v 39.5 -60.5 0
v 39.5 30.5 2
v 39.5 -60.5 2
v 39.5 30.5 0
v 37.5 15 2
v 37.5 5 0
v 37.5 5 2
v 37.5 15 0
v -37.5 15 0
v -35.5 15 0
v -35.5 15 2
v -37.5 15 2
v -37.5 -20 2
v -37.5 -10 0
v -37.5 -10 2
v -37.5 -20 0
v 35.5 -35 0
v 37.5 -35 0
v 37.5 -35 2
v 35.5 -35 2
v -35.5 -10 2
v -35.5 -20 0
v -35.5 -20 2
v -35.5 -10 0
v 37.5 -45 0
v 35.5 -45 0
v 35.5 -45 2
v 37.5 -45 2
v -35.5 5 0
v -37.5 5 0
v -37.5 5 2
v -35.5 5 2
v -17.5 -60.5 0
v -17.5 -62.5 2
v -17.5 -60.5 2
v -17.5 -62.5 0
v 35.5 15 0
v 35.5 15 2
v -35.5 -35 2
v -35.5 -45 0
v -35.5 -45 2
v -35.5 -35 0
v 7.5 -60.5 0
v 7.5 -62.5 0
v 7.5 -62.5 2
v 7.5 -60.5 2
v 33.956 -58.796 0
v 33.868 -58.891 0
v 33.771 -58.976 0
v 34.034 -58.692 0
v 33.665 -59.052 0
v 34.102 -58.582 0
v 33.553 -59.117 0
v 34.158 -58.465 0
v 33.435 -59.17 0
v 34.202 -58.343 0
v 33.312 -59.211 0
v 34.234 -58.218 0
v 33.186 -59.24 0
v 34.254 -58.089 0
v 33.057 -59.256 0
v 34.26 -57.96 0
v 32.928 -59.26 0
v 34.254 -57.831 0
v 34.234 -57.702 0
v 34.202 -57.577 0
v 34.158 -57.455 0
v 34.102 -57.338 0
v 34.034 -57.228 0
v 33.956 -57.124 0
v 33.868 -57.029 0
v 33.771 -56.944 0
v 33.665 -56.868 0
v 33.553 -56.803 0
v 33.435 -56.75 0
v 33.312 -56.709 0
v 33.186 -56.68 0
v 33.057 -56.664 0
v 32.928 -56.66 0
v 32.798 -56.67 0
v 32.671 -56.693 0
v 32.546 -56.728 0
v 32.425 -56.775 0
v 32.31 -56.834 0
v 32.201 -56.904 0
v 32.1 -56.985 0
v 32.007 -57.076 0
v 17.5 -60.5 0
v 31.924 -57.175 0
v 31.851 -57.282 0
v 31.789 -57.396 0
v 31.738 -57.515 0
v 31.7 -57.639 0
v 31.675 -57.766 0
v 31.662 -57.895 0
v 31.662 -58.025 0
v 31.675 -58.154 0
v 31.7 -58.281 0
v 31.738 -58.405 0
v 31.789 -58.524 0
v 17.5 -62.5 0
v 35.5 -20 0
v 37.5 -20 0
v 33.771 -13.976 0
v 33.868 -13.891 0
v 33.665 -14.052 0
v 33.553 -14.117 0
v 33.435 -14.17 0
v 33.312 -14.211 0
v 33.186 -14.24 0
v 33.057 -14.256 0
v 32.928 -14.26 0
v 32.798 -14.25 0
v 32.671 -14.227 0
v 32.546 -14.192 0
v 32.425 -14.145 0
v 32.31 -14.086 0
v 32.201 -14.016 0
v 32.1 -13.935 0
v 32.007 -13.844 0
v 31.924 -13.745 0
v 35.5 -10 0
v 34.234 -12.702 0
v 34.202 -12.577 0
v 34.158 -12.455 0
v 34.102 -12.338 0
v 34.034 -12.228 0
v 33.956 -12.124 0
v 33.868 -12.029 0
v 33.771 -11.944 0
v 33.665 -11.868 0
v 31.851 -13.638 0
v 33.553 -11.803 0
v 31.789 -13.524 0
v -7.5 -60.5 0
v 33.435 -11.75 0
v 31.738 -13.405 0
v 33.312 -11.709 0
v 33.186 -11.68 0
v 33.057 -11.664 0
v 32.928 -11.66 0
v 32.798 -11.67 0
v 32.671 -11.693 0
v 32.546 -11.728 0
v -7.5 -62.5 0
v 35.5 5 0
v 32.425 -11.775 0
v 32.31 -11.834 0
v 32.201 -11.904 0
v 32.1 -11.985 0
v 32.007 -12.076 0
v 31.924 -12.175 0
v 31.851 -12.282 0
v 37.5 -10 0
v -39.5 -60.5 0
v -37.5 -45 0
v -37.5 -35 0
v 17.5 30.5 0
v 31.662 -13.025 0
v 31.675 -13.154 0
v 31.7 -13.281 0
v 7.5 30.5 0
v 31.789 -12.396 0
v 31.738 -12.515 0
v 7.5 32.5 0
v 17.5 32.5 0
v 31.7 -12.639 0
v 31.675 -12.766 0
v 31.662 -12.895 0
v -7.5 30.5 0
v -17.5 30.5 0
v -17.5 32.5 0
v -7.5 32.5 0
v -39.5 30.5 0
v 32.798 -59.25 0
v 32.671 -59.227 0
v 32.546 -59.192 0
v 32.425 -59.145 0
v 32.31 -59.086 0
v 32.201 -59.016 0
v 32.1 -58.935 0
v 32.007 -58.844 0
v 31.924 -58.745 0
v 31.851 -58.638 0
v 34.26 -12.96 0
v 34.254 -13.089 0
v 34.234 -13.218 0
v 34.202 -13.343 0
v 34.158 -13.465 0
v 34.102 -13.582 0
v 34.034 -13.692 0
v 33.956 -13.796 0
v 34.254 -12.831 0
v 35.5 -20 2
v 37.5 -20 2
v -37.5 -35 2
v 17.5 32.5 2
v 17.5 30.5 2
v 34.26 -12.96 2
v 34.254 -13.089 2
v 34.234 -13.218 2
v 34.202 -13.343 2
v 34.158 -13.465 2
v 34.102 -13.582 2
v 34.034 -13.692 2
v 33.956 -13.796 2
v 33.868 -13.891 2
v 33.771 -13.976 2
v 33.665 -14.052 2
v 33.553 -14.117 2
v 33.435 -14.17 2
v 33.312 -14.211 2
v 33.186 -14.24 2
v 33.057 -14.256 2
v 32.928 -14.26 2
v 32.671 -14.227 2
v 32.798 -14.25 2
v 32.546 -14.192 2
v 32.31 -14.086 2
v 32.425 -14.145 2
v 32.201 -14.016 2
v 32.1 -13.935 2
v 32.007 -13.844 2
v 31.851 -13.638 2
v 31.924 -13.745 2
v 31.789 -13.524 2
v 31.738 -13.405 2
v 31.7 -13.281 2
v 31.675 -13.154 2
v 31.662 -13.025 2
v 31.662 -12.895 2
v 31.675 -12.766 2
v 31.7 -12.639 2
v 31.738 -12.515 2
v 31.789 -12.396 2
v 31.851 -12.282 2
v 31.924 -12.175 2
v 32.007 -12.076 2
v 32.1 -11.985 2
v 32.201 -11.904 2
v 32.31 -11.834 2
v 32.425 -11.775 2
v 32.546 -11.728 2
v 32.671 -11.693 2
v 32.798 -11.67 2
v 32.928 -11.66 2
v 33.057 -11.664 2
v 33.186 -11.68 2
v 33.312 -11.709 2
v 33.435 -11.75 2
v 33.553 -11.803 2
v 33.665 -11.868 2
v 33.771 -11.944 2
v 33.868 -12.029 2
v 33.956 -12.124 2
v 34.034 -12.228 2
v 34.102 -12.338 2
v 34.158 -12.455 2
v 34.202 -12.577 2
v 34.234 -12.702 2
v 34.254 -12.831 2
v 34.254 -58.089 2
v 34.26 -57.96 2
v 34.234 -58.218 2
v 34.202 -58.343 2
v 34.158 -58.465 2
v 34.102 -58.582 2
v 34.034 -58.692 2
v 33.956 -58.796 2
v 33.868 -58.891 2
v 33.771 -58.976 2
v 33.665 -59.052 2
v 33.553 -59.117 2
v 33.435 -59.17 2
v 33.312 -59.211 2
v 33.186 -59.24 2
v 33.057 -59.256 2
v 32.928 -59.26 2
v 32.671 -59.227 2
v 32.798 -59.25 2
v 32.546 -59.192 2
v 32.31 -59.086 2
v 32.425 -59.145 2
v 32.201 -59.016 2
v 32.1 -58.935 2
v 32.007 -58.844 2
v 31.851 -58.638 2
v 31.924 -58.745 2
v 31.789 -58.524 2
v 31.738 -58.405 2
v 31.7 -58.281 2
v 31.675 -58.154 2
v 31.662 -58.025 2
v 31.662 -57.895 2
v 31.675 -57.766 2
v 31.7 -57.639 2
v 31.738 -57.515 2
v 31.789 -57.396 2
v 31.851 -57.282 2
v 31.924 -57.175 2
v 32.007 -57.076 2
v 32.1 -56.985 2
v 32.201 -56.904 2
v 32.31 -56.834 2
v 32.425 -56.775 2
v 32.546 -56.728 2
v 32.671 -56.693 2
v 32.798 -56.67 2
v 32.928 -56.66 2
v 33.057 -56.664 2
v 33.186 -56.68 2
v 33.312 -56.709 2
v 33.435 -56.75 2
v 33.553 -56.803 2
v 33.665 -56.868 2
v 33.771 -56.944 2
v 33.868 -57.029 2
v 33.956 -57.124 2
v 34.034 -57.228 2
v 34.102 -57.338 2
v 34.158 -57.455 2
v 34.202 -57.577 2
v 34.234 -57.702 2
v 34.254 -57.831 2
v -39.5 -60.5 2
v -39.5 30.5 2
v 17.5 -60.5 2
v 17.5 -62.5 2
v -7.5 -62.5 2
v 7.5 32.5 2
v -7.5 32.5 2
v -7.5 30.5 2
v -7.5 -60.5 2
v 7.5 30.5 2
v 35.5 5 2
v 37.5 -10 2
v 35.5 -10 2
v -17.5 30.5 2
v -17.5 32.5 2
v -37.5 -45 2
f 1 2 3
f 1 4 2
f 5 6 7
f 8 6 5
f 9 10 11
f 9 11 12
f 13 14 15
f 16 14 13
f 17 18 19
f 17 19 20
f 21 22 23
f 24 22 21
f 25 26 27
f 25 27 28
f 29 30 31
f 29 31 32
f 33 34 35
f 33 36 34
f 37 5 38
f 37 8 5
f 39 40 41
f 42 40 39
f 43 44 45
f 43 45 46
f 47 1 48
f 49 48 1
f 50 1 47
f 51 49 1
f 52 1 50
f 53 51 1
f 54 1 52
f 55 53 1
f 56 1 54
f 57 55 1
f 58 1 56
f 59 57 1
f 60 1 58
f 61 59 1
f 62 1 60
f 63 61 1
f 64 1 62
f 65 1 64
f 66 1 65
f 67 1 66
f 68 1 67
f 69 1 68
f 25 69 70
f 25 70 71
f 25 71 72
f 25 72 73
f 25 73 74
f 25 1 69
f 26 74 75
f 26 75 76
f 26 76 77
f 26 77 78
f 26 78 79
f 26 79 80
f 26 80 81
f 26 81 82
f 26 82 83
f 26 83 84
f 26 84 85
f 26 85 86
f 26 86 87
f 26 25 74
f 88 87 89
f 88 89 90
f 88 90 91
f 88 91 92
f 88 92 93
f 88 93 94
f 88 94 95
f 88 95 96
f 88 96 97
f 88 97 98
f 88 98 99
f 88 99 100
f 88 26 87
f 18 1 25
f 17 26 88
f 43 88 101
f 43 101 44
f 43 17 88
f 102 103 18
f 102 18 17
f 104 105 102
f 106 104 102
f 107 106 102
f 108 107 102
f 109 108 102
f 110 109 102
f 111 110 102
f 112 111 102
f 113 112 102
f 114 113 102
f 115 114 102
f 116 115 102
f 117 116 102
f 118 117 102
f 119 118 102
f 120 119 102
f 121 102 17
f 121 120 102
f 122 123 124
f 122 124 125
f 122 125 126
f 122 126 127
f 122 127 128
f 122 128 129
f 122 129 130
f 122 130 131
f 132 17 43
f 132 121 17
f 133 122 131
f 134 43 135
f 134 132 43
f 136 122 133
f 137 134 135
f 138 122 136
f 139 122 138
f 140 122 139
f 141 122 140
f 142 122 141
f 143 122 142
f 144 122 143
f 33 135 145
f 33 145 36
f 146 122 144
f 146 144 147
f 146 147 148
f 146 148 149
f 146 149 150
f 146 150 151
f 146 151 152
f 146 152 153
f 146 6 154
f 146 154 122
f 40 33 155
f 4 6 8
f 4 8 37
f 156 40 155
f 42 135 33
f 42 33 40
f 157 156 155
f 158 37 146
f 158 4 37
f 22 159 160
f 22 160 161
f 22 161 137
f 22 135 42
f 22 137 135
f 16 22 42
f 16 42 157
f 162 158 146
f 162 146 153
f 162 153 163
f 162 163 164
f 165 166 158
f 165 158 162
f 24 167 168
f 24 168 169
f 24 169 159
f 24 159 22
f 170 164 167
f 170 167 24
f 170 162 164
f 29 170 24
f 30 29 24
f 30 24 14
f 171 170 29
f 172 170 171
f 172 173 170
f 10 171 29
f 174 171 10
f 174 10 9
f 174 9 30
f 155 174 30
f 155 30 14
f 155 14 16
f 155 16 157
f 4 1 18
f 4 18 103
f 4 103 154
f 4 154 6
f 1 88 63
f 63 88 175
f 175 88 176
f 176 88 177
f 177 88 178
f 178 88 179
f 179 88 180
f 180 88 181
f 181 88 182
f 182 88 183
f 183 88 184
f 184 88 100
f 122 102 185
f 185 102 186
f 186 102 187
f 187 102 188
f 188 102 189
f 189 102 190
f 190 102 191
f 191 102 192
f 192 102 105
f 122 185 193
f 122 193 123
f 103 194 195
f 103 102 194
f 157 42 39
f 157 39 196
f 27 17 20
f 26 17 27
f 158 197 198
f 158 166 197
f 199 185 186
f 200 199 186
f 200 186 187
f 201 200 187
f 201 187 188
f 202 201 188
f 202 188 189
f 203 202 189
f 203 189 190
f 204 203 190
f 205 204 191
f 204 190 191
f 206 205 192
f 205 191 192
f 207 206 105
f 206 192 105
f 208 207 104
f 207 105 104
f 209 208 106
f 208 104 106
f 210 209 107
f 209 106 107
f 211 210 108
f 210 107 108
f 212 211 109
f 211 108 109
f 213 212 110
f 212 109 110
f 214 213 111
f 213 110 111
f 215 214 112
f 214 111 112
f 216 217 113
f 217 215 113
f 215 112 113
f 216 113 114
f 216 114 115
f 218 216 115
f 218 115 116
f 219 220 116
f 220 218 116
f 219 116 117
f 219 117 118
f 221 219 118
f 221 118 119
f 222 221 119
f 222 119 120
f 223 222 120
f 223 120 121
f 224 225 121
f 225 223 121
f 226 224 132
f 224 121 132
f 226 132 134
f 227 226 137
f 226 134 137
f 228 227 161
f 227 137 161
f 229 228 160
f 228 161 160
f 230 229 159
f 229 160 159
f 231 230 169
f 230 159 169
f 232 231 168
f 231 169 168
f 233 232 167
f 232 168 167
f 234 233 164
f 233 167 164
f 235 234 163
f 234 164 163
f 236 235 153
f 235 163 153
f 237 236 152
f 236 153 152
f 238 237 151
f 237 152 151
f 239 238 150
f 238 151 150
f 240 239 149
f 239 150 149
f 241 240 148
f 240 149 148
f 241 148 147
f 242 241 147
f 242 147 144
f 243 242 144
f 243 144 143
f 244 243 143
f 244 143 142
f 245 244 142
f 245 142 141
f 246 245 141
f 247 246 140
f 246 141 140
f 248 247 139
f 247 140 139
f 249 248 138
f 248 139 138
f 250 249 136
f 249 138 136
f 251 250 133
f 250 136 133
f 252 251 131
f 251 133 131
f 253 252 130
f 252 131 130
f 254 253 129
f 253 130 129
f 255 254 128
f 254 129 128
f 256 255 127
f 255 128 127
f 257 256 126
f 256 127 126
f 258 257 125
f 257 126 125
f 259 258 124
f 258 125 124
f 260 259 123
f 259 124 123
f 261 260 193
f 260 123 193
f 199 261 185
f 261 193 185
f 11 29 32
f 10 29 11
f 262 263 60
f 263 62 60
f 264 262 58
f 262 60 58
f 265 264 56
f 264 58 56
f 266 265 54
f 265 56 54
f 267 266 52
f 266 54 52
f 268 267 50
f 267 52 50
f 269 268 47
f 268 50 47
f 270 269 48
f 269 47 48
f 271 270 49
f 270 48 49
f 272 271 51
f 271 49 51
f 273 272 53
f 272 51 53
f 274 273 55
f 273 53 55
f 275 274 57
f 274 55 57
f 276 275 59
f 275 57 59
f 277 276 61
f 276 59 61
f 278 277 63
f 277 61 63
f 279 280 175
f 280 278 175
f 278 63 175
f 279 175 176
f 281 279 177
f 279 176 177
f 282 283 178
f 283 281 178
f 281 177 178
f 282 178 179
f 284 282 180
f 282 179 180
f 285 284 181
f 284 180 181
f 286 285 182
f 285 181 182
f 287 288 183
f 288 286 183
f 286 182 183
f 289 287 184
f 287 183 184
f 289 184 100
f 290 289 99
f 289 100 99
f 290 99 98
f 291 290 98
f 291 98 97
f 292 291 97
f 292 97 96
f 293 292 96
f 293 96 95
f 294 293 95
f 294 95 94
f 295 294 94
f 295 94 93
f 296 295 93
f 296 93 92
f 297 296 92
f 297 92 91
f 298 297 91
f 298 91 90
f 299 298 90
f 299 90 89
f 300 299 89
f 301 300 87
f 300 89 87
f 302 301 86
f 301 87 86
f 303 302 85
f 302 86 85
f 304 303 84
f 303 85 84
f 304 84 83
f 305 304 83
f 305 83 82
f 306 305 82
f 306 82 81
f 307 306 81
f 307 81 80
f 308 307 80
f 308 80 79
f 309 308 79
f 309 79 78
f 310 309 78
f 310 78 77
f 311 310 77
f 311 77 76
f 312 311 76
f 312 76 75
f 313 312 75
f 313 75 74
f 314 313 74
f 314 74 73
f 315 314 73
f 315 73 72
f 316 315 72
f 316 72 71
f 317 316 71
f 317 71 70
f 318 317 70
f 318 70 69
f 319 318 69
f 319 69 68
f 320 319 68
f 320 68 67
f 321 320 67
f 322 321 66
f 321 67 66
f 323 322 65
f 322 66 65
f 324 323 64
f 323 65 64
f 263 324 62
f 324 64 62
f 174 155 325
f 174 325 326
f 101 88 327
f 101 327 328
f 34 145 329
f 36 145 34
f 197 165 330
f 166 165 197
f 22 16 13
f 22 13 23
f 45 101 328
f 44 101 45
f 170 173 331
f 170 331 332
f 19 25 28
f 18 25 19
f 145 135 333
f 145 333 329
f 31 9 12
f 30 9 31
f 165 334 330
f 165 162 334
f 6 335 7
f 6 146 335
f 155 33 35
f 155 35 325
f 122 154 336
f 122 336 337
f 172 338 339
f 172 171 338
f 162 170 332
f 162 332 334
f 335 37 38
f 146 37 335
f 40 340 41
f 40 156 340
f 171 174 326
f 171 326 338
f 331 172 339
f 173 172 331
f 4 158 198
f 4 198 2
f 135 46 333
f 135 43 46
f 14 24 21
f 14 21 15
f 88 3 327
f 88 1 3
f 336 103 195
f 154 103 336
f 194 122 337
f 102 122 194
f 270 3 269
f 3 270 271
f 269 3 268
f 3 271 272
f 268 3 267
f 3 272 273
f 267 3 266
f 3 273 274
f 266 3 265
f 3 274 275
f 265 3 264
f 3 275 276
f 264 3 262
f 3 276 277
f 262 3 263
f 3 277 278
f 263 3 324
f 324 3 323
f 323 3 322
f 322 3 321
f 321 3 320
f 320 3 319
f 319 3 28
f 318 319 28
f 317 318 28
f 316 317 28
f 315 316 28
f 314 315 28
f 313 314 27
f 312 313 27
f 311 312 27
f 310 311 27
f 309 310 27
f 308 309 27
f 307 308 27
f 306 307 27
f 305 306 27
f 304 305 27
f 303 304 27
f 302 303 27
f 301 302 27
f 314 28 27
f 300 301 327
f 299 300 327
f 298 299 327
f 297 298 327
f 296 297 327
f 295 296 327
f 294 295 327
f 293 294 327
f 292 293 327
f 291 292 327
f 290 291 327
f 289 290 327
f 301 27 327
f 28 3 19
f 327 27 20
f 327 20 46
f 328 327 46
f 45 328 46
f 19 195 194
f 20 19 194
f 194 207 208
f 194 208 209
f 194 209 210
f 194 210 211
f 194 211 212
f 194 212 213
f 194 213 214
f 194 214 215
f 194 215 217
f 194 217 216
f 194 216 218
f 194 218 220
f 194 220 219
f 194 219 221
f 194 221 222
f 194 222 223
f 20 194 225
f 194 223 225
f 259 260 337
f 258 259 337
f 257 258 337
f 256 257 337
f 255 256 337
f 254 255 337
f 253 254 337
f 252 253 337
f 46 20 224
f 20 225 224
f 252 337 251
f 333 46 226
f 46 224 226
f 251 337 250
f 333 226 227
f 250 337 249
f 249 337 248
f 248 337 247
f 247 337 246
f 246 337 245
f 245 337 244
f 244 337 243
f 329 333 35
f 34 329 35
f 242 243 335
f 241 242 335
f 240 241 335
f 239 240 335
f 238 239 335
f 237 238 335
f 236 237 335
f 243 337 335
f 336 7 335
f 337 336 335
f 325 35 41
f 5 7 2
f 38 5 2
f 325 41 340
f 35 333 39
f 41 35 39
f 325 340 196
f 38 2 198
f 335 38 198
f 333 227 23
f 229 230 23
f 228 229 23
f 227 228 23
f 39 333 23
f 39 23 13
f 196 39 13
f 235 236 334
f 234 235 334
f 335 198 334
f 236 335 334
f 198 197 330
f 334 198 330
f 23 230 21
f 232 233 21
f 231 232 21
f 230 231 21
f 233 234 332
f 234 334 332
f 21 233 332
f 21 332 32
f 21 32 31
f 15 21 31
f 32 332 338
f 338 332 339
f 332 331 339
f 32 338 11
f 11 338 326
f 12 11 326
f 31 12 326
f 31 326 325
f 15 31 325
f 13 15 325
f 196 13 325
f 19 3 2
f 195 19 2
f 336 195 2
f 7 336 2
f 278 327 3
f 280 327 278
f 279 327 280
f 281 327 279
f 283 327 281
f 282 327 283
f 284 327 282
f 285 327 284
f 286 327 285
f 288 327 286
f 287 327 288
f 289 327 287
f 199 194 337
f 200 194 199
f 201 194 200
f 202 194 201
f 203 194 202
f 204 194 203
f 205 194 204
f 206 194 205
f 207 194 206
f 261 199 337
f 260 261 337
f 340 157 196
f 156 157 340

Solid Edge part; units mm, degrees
sketch "Sketch1" plane through (0, 0, 0) normal (0, 0, 1) x (1, 0, 0)
  line L0 (7.5, -60.5) -> (-7.5, -60.5)
  line L1 (-7.5, -60.5) -> (-7.5, -62.5)
  line L2 (-7.5, -62.5) -> (-17.5, -62.5)
  line L3 (-17.5, -62.5) -> (-17.5, -60.5)
  line L4 (-17.5, -60.5) -> (-39.5, -60.5)
  line L5 (-39.5, -60.5) -> (-39.5, 30.5)
  line L6 (-39.5, 30.5) -> (-17.5, 30.5)
  line L7 (-17.5, 30.5) -> (-17.5, 32.5)
  line L8 (-17.5, 32.5) -> (-7.5, 32.5)
  line L9 (-7.5, 32.5) -> (-7.5, 30.5)
  line L10 (-7.5, 30.5) -> (7.5, 30.5)
  line L11 (7.5, 30.5) -> (7.5, 32.5)
  line L12 (7.5, 32.5) -> (17.5, 32.5)
  line L13 (17.5, 32.5) -> (17.5, 30.5)
  line L14 (17.5, 30.5) -> (39.5, 30.5)
  line L15 (39.5, 30.5) -> (39.5, -60.5)
  line L16 (39.5, -60.5) -> (17.5, -60.5)
  line L17 (17.5, -60.5) -> (17.5, -62.5)
  line L18 (17.5, -62.5) -> (7.5, -62.5)
  line L19 (7.5, -62.5) -> (7.5, -60.5)
  line L20 (37.5, -45) -> (37.5, -35)
  line L21 (35.5, -45) -> (37.5, -45)
  line L22 (35.5, -35) -> (35.5, -45)
  line L23 (37.5, -35) -> (35.5, -35)
  line L24 (-35.5, -20) -> (-35.5, -10)
  line L25 (-37.5, -20) -> (-35.5, -20)
  line L26 (-37.5, -10) -> (-37.5, -20)
  line L27 (-35.5, -10) -> (-37.5, -10)
  line L28 (-37.5, -35) -> (-37.5, -45)
  line L29 (-35.5, -35) -> (-37.5, -35)
  line L30 (-35.5, -45) -> (-35.5, -35)
  line L31 (-37.5, -45) -> (-35.5, -45)
  line L32 (35.5, 5) -> (37.5, 5)
  line L33 (35.5, 15) -> (35.5, 5)
  line L34 (37.5, 15) -> (35.5, 15)
  line L35 (37.5, 5) -> (37.5, 15)
  circle A0 centre (32.96, -12.96) radius 1.3
  circle A1 centre (32.96, -57.96) radius 1.3
  line L36 (-37.5, 5) -> (-35.5, 5)
  line L37 (-37.5, 15) -> (-37.5, 5)
  line L38 (-35.5, 15) -> (-37.5, 15)
  line L39 (-35.5, 5) -> (-35.5, 15)
  line L40 (35.5, -10) -> (35.5, -20)
  line L41 (37.5, -10) -> (35.5, -10)
  line L42 (37.5, -20) -> (37.5, -10)
  line L43 (35.5, -20) -> (37.5, -20)
extrude "ExtrudedProtrusion_1" add sketch "Sketch1" along normal blind 2
properties material "Acrylic, high impact grade"
